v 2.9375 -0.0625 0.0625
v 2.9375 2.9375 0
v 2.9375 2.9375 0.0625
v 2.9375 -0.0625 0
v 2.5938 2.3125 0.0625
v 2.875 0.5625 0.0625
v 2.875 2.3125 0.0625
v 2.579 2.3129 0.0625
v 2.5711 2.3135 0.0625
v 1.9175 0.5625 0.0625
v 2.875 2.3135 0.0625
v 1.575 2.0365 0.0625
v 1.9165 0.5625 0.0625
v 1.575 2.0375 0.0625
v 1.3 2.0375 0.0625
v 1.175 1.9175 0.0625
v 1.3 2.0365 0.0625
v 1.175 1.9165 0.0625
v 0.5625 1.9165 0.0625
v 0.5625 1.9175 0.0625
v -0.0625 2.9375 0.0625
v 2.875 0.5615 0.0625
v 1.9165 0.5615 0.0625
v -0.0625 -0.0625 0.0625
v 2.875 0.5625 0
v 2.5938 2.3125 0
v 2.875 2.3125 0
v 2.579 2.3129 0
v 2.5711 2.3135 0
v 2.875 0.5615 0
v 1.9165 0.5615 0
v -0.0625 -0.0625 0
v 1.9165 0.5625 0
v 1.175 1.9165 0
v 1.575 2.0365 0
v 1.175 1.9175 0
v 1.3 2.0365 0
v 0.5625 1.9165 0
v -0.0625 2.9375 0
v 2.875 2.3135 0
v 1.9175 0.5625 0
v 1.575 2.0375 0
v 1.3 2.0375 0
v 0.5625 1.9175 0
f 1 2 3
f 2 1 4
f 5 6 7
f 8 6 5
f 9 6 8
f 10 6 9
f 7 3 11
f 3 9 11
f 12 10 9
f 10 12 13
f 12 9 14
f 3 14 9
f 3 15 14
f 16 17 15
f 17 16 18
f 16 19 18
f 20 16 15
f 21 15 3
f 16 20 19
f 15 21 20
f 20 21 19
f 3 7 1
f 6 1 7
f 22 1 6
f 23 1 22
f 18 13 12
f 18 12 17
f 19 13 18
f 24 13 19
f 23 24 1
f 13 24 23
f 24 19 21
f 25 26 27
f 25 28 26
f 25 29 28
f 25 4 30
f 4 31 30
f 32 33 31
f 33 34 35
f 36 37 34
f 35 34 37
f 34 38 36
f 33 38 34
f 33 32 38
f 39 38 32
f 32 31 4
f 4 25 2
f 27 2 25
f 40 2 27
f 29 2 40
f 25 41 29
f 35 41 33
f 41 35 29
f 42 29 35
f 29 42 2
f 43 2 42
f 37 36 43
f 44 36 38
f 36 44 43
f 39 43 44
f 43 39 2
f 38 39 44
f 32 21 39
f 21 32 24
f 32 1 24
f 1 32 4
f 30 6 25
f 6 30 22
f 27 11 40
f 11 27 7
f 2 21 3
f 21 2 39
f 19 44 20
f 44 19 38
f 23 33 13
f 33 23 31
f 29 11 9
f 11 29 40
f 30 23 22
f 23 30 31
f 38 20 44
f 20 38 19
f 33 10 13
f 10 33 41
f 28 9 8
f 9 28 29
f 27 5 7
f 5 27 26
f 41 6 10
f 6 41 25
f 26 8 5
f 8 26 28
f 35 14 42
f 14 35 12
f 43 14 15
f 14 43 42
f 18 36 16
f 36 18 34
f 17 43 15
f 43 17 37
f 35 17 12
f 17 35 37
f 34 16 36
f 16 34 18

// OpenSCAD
// element21.scad — right-turn double-speed belt tile (two blue arrows)
// Units: inches

straight   = false;
left_turn  = false;
right_turn = true;

plate_w = 2 + 7/8;
plate_d = 2 + 7/8;
plate_h = 1/16;
frame_w = 1/16;

belt_w    = 1.75;
belt_half = belt_w / 2;

hole_d = 3/32;
hole_r = hole_d / 2;

roller_count  = 13;
roller_h_size = 3/16;
roller_r      = roller_h_size / 2;
roller_inset  = plate_w / 20;
roller_x_lo   = 2 * roller_inset;
roller_x_hi   = plate_w - 2 * roller_inset;
roller_y_step = (plate_w - 2 * roller_inset) / 12;

b_L = plate_w / 2 - belt_half;
b_R = plate_w / 2 + belt_half;
nub = roller_x_hi - b_R;

cx         = plate_w / 2;
r_curve    = 0.48;
cx_l       = cx - r_curve;
cx_r       = cx + r_curve;
r_outer   = r_curve + belt_half;
// Belt arc threshold for roller row selection — geometric constant, not arrow-derived
y_arc_ctr = plate_d/2 + r_curve + 0.24;

arrow_w       = belt_w * 0.75;
arrow_shaft_w = arrow_w * 0.4;
arrow_head_h  = arrow_w / 2;
arrow_shaft_h = 0.25;
arrow_h       = arrow_shaft_h + arrow_head_h;
arrow_outline = 1/8;

// Upward arrow: tip at same position as element20's top arrow tip
arrow_tip_y  = 3 * plate_d / 20 + 1/4 + 7 * plate_d / 10;
arrow_up_x   = cx;
arrow_up_y   = arrow_tip_y - arrow_h;
y_merge_up   = arrow_tip_y - arrow_head_h;  // shaft/head junction = top of vertical segment

// Leftward arrow: shaft base inset from right edge by same distance as top arrow tip from top edge
// After rotate([0,0,90]) on arrow_2d, tip lands at (-arrow_h, 0) relative to translate origin
arrow_lf_y = plate_d / 2;
arrow_lf_x = plate_w - (plate_d - arrow_tip_y);
// Horizontal shaft: end where the arrowhead outer edge meets the shaft strip outer edge
h_straight = 0;

module rivet_holes() {
    spacing_x = plate_w / 10;
    spacing_y = plate_d / 10;
    inset_x   = spacing_x / 2;
    inset_y   = spacing_y / 2;
    translate([plate_w - inset_x, plate_d - inset_y, -1])
        cylinder(h = plate_h + 2, r = hole_r, $fn = 20);
    for (i = [0:9]) {
        translate([inset_x, inset_y + i * spacing_y, -1])
            cylinder(h = plate_h + 2, r = hole_r, $fn = 20);
        translate([inset_x + i * spacing_x, inset_y, -1])
            cylinder(h = plate_h + 2, r = hole_r, $fn = 20);
        if (inset_x + i * spacing_x <= roller_x_lo + roller_r - hole_r ||
            inset_x + i * spacing_x >= roller_x_hi - roller_r + hole_r) {
            translate([inset_x + i * spacing_x, plate_d - inset_y, -1])
                cylinder(h = plate_h + 2, r = hole_r, $fn = 20);
        }
    }
}

module frame_with_id(colors = []) {
    id_cover = plate_h / 8;
    region_w = (plate_w + 2 * frame_w) / 6;
    mark_h   = plate_h - id_cover;

    color("black")
    difference() {
        translate([-frame_w, -frame_w, 0])
            cube([plate_w + 2 * frame_w, plate_d + 2 * frame_w, plate_h]);
        translate([0, 0, -0.001])
            cube([plate_w, plate_d, plate_h + 0.002]);
        translate([-frame_w, plate_d, -0.001])
            cube([plate_w + 2 * frame_w, frame_w + 0.002, plate_h + 0.002]);
    }

    for (i = [0:5]) {
        c = (colors[i] != undef) ? colors[i] : "black";
        color(c)
        translate([-frame_w + i * region_w, plate_d, 0])
            cube([region_w, frame_w, mark_h]);
        color("black")
        translate([-frame_w + i * region_w, plate_d, mark_h])
            cube([region_w, frame_w, id_cover]);
    }
}

module belt_cutout() {
    // Straight vertical strip (top)
    translate([(plate_w - belt_w) / 2, plate_d/2 + r_curve - 0.001, -0.001])
        cube([belt_w, plate_d/2 - r_curve + 0.002, plate_h + 0.002]);
    // Horizontal entry from right
    translate([cx_r - 0.001, plate_d/2 - belt_half - 0.001, -0.001])
        cube([plate_w - cx_r + 0.002, belt_w + 0.002, plate_h + 0.002]);
    // Arc corner fill: lower-left quadrant at (cx_r, plate_d/2 + r_curve)
    translate([cx_r, plate_d/2 + r_curve, -0.001])
    linear_extrude(plate_h + 0.002)
    intersection() {
        circle(r = r_outer, $fn = 120);
        translate([-r_outer, -r_outer]) square([r_outer, r_outer]);
    }
    // Curved corner — bottom-left of the top-right uncovered square
    translate([b_R, plate_d/2 + belt_half, -0.001])
    linear_extrude(plate_h + 0.002)
    difference() {
        square([b_L/2, b_L/2]);
        translate([b_L/2, b_L/2])
            circle(r = b_L/2, $fn = 120);
    }
}

module roller_slots() {
    // a. Horizontal bars — top-section only, right-clipped; i=12 full-width
    for (i = [0:roller_count - 1]) {
        if (roller_inset + i * roller_y_step >= y_arc_ctr - roller_y_step) {
            translate([0, 0, -0.001])
            hull() {
                translate([roller_x_lo + roller_r,
                           roller_inset + i * roller_y_step, 0])
                    cylinder(h = plate_h + 0.002, r = roller_r, $fn = 20);
                translate([(i == roller_count - 1 ? roller_x_hi : b_R) - roller_r,
                           roller_inset + i * roller_y_step, 0])
                    cylinder(h = plate_h + 0.002, r = roller_r, $fn = 20);
            }
        }
    }
    // b. Vertical entry bars — right side; skip if rx < cx_r
    for (i = [0:roller_count - 1]) {
        if (roller_inset + i * roller_y_step >= cx_r) {
            y_hi = (i == roller_count - 1) ? plate_d - roller_x_lo : plate_d/2 + belt_half;
            translate([0, 0, -0.001])
            hull() {
                translate([roller_inset + i * roller_y_step, roller_x_lo + roller_r, 0])
                    cylinder(h = plate_h + 0.002, r = roller_r, $fn = 20);
                translate([roller_inset + i * roller_y_step, y_hi - roller_r, 0])
                    cylinder(h = plate_h + 0.002, r = roller_r, $fn = 20);
            }
        }
    }
    // c. Arc radial bars — 11 bars, center (cx_r, plate_d/2 + r_curve), 180°–270°
    r_outer_bars = r_outer + nub;
    for (k = [0:10]) {
        theta = 180 + 2.25 + k * (85.5 / 10);
        translate([cx_r, plate_d/2 + r_curve, 0])
        rotate([0, 0, theta])
        translate([0, 0, -0.001])
        hull() {
            translate([r_outer_bars - roller_r, 0, 0])
                cylinder(h = plate_h + 0.002, r = roller_r, $fn = 20);
            translate([r_outer_bars - roller_r - nub, 0, 0])
                cylinder(h = plate_h + 0.002, r = roller_r, $fn = 20);
        }
    }
    // d. Upper diagonal corner — upper-right of belt entry
    translate([b_R, plate_d/2 + belt_half, 0])
    rotate([0, 0, 45])
    translate([0, 0, -0.001])
    hull() {
        cylinder(h = plate_h + 0.002, r = roller_r, $fn = 20);
        translate([nub, 0, 0])
            cylinder(h = plate_h + 0.002, r = roller_r, $fn = 20);
    }
}

module plate() {
    difference() {
        color("darkgray")
            cube([plate_w, plate_d, plate_h]);
        rivet_holes();
        roller_slots();
        belt_cutout();
    }
}

module rollers() {
    color("blue")
    difference() {
        union() {
            // a. Horizontal bars
            for (i = [0:roller_count - 1]) {
                if (roller_inset + i * roller_y_step >= y_arc_ctr - roller_y_step) {
                    hull() {
                        translate([roller_x_lo + roller_r,
                                   roller_inset + i * roller_y_step, 0])
                            cylinder(h = plate_h, r = roller_r, $fn = 20);
                        translate([(i == roller_count - 1 ? roller_x_hi : b_R) - roller_r,
                                   roller_inset + i * roller_y_step, 0])
                            cylinder(h = plate_h, r = roller_r, $fn = 20);
                    }
                }
            }
            // b. Vertical entry bars
            for (i = [0:roller_count - 1]) {
                if (roller_inset + i * roller_y_step >= cx_r) {
                    y_hi = (i == roller_count - 1) ? plate_d - roller_x_lo : plate_d/2 + belt_half;
                    hull() {
                        translate([roller_inset + i * roller_y_step, roller_x_lo + roller_r, 0])
                            cylinder(h = plate_h, r = roller_r, $fn = 20);
                        translate([roller_inset + i * roller_y_step, y_hi - roller_r, 0])
                            cylinder(h = plate_h, r = roller_r, $fn = 20);
                    }
                }
            }
            // c. Arc radial bars
            r_outer_bars = r_outer + nub;
            for (k = [0:10]) {
                theta = 180 + 2.25 + k * (85.5 / 10);
                translate([cx_r, plate_d/2 + r_curve, 0])
                rotate([0, 0, theta])
                hull() {
                    translate([r_outer_bars - roller_r, 0, 0])
                        cylinder(h = plate_h, r = roller_r, $fn = 20);
                    translate([r_outer_bars - roller_r - nub, 0, 0])
                        cylinder(h = plate_h, r = roller_r, $fn = 20);
                }
            }
            // d. Upper diagonal corner — upper-right of belt entry
            translate([b_R, plate_d/2 + belt_half, 0])
            rotate([0, 0, 45])
            hull() {
                cylinder(h = plate_h, r = roller_r, $fn = 20);
                translate([nub, 0, 0])
                    cylinder(h = plate_h, r = roller_r, $fn = 20);
            }
        }
        belt_cutout();
    }
}

module rivets() {
    spacing_x = plate_w / 10;
    spacing_y = plate_d / 10;
    inset_x   = spacing_x / 2;
    inset_y   = spacing_y / 2;
    color("lightgray") {
        translate([plate_w - inset_x, plate_d - inset_y, 0])
            cylinder(h = plate_h, r = hole_r, $fn = 20);
        for (i = [0:9]) {
            translate([inset_x, inset_y + i * spacing_y, 0])
                cylinder(h = plate_h, r = hole_r, $fn = 20);
            translate([inset_x + i * spacing_x, inset_y, 0])
                cylinder(h = plate_h, r = hole_r, $fn = 20);
            if (inset_x + i * spacing_x <= roller_x_lo + roller_r - hole_r ||
                inset_x + i * spacing_x >= roller_x_hi - roller_r + hole_r) {
                translate([inset_x + i * spacing_x, plate_d - inset_y, 0])
                    cylinder(h = plate_h, r = hole_r, $fn = 20);
            }
        }
    }
}

module arrow_2d() {
    polygon([
        [-arrow_shaft_w / 2, 0],
        [ arrow_shaft_w / 2, 0],
        [ arrow_shaft_w / 2, arrow_shaft_h],
        [ arrow_w / 2,       arrow_shaft_h],
        [ 0,                 arrow_h],
        [-arrow_w / 2,       arrow_shaft_h],
        [-arrow_shaft_w / 2, arrow_shaft_h]
    ]);
}

module arrows() {
    color("blue") {
        // Curved upward arrow (element11-style)
        union() {
            // Vertical segment: arc center up to arrowhead base
            translate([cx - arrow_shaft_w/2, plate_d/2 + r_curve, 0])
            linear_extrude(plate_h)
            difference() {
                square([arrow_shaft_w, y_merge_up - (plate_d/2 + r_curve)]);
                translate([arrow_outline, 0])
                    square([arrow_shaft_w - 2*arrow_outline, y_merge_up - (plate_d/2 + r_curve)]);
            }
            // Arc shaft: hollow annulus, lower-left quadrant (180°–270°)
            translate([cx_r, plate_d/2 + r_curve, 0])
            linear_extrude(plate_h)
            intersection() {
                difference() {
                    difference() {
                        circle(r = r_curve + arrow_shaft_w/2, $fn = 120);
                        circle(r = r_curve - arrow_shaft_w/2, $fn = 120);
                    }
                    offset(delta = -arrow_outline)
                    difference() {
                        circle(r = r_curve + arrow_shaft_w/2, $fn = 120);
                        circle(r = r_curve - arrow_shaft_w/2, $fn = 120);
                    }
                }
                translate([-(r_curve + arrow_shaft_w/2), -(r_curve + arrow_shaft_w/2)])
                    square([r_curve + arrow_shaft_w/2, r_curve + arrow_shaft_w/2]);
            }
            // Horizontal segment: from arc 270° endpoint going right
            translate([cx_r, plate_d/2 - arrow_shaft_w/2, 0])
            linear_extrude(plate_h)
            difference() {
                square([h_straight, arrow_shaft_w]);
                translate([0, arrow_outline])
                    square([h_straight, arrow_shaft_w - 2*arrow_outline]);
            }
            // End cap — 90° V matching arrowhead tip angle
            translate([cx_r + h_straight, plate_d/2, 0])
            linear_extrude(plate_h)
            union() {
                hull() {
                    translate([-arrow_shaft_w / 2, 0]) circle(r = arrow_outline / 2, $fn = 20);
                    translate([-arrow_outline / sqrt(2),  arrow_shaft_w / 2 - arrow_outline / sqrt(2)]) circle(r = arrow_outline / 2, $fn = 20);
                }
                hull() {
                    translate([-arrow_shaft_w / 2, 0]) circle(r = arrow_outline / 2, $fn = 20);
                    translate([-arrow_outline / sqrt(2), -arrow_shaft_w / 2 + arrow_outline / sqrt(2)]) circle(r = arrow_outline / 2, $fn = 20);
                }
            }
            // Arrowhead — head only, base open to vertical shaft
            translate([cx, arrow_up_y, 0])
            linear_extrude(plate_h)
            intersection() {
                difference() {
                    arrow_2d();
                    offset(delta = -arrow_outline) arrow_2d();
                }
                translate([-arrow_w / 2, arrow_shaft_h])
                    square([arrow_w, arrow_head_h]);
            }
        }
        // Leftward arrow
        translate([arrow_lf_x, arrow_lf_y, 0])
        linear_extrude(plate_h)
        rotate([0, 0, 90])
        difference() {
            arrow_2d();
            offset(delta = -arrow_outline) arrow_2d();
        }
    }
}

module belt() {
    color("black")
    difference() {
        union() {
            translate([cx_r, plate_d/2 - belt_half, 0])
                cube([plate_w - cx_r, belt_w, plate_h]);
            translate([cx_r, plate_d/2 + r_curve, 0])
            linear_extrude(plate_h)
            intersection() {
                circle(r = r_outer, $fn = 120);
                translate([-r_outer, -r_outer]) square([r_outer, r_outer]);
            }
            translate([b_L, plate_d/2 + r_curve, 0])
                cube([belt_w, plate_d/2 - r_curve, plate_h]);
            translate([b_R, plate_d/2 + belt_half, 0])
            linear_extrude(plate_h)
            difference() {
                square([b_L/2, b_L/2]);
                translate([b_L/2, b_L/2])
                    circle(r = b_L/2, $fn = 120);
            }
        }
        // Curved arrow cutouts
        union() {
            // Vertical segment cutout
            translate([cx - arrow_shaft_w/2, plate_d/2 + r_curve - 0.001, -0.001])
            linear_extrude(plate_h + 0.002)
            difference() {
                square([arrow_shaft_w, y_merge_up - (plate_d/2 + r_curve) + 0.001]);
                translate([arrow_outline, 0])
                    square([arrow_shaft_w - 2*arrow_outline, y_merge_up - (plate_d/2 + r_curve)]);
            }
            // Arc shaft cutout
            translate([cx_r, plate_d/2 + r_curve, -0.001])
            linear_extrude(plate_h + 0.002)
            intersection() {
                difference() {
                    difference() {
                        circle(r = r_curve + arrow_shaft_w/2, $fn = 120);
                        circle(r = r_curve - arrow_shaft_w/2, $fn = 120);
                    }
                    offset(delta = -arrow_outline)
                    difference() {
                        circle(r = r_curve + arrow_shaft_w/2, $fn = 120);
                        circle(r = r_curve - arrow_shaft_w/2, $fn = 120);
                    }
                }
                translate([-(r_curve + arrow_shaft_w/2), -(r_curve + arrow_shaft_w/2)])
                    square([r_curve + arrow_shaft_w/2, r_curve + arrow_shaft_w/2]);
            }
            // Horizontal segment cutout
            translate([cx_r, plate_d/2 - arrow_shaft_w/2, -0.001])
            linear_extrude(plate_h + 0.002)
            difference() {
                square([h_straight, arrow_shaft_w]);
                translate([0, arrow_outline])
                    square([h_straight, arrow_shaft_w - 2*arrow_outline]);
            }
            // End cap cutout — 90° V matching arrowhead tip angle
            translate([cx_r + h_straight, plate_d/2, -0.001])
            linear_extrude(plate_h + 0.002)
            union() {
                hull() {
                    translate([-arrow_shaft_w / 2, 0]) circle(r = arrow_outline / 2, $fn = 20);
                    translate([-arrow_outline / sqrt(2),  arrow_shaft_w / 2 - arrow_outline / sqrt(2)]) circle(r = arrow_outline / 2, $fn = 20);
                }
                hull() {
                    translate([-arrow_shaft_w / 2, 0]) circle(r = arrow_outline / 2, $fn = 20);
                    translate([-arrow_outline / sqrt(2), -arrow_shaft_w / 2 + arrow_outline / sqrt(2)]) circle(r = arrow_outline / 2, $fn = 20);
                }
            }
            // Arrowhead cutout (head only)
            translate([cx, arrow_up_y, -0.001])
            linear_extrude(plate_h + 0.002)
            intersection() {
                difference() {
                    arrow_2d();
                    offset(delta = -arrow_outline) arrow_2d();
                }
                translate([-arrow_w / 2, arrow_shaft_h])
                    square([arrow_w, arrow_head_h]);
            }
        }
        // Cut leftward arrow outline from belt
        translate([arrow_lf_x, arrow_lf_y, -0.001])
        linear_extrude(plate_h + 0.002)
        rotate([0, 0, 90])
        difference() {
            arrow_2d();
            offset(delta = -arrow_outline) arrow_2d();
        }
    }
}

frame_with_id([undef, undef, "blue", "blue", "blue", "blue"]);
plate();
rivets();
rollers();
belt();
arrows();
